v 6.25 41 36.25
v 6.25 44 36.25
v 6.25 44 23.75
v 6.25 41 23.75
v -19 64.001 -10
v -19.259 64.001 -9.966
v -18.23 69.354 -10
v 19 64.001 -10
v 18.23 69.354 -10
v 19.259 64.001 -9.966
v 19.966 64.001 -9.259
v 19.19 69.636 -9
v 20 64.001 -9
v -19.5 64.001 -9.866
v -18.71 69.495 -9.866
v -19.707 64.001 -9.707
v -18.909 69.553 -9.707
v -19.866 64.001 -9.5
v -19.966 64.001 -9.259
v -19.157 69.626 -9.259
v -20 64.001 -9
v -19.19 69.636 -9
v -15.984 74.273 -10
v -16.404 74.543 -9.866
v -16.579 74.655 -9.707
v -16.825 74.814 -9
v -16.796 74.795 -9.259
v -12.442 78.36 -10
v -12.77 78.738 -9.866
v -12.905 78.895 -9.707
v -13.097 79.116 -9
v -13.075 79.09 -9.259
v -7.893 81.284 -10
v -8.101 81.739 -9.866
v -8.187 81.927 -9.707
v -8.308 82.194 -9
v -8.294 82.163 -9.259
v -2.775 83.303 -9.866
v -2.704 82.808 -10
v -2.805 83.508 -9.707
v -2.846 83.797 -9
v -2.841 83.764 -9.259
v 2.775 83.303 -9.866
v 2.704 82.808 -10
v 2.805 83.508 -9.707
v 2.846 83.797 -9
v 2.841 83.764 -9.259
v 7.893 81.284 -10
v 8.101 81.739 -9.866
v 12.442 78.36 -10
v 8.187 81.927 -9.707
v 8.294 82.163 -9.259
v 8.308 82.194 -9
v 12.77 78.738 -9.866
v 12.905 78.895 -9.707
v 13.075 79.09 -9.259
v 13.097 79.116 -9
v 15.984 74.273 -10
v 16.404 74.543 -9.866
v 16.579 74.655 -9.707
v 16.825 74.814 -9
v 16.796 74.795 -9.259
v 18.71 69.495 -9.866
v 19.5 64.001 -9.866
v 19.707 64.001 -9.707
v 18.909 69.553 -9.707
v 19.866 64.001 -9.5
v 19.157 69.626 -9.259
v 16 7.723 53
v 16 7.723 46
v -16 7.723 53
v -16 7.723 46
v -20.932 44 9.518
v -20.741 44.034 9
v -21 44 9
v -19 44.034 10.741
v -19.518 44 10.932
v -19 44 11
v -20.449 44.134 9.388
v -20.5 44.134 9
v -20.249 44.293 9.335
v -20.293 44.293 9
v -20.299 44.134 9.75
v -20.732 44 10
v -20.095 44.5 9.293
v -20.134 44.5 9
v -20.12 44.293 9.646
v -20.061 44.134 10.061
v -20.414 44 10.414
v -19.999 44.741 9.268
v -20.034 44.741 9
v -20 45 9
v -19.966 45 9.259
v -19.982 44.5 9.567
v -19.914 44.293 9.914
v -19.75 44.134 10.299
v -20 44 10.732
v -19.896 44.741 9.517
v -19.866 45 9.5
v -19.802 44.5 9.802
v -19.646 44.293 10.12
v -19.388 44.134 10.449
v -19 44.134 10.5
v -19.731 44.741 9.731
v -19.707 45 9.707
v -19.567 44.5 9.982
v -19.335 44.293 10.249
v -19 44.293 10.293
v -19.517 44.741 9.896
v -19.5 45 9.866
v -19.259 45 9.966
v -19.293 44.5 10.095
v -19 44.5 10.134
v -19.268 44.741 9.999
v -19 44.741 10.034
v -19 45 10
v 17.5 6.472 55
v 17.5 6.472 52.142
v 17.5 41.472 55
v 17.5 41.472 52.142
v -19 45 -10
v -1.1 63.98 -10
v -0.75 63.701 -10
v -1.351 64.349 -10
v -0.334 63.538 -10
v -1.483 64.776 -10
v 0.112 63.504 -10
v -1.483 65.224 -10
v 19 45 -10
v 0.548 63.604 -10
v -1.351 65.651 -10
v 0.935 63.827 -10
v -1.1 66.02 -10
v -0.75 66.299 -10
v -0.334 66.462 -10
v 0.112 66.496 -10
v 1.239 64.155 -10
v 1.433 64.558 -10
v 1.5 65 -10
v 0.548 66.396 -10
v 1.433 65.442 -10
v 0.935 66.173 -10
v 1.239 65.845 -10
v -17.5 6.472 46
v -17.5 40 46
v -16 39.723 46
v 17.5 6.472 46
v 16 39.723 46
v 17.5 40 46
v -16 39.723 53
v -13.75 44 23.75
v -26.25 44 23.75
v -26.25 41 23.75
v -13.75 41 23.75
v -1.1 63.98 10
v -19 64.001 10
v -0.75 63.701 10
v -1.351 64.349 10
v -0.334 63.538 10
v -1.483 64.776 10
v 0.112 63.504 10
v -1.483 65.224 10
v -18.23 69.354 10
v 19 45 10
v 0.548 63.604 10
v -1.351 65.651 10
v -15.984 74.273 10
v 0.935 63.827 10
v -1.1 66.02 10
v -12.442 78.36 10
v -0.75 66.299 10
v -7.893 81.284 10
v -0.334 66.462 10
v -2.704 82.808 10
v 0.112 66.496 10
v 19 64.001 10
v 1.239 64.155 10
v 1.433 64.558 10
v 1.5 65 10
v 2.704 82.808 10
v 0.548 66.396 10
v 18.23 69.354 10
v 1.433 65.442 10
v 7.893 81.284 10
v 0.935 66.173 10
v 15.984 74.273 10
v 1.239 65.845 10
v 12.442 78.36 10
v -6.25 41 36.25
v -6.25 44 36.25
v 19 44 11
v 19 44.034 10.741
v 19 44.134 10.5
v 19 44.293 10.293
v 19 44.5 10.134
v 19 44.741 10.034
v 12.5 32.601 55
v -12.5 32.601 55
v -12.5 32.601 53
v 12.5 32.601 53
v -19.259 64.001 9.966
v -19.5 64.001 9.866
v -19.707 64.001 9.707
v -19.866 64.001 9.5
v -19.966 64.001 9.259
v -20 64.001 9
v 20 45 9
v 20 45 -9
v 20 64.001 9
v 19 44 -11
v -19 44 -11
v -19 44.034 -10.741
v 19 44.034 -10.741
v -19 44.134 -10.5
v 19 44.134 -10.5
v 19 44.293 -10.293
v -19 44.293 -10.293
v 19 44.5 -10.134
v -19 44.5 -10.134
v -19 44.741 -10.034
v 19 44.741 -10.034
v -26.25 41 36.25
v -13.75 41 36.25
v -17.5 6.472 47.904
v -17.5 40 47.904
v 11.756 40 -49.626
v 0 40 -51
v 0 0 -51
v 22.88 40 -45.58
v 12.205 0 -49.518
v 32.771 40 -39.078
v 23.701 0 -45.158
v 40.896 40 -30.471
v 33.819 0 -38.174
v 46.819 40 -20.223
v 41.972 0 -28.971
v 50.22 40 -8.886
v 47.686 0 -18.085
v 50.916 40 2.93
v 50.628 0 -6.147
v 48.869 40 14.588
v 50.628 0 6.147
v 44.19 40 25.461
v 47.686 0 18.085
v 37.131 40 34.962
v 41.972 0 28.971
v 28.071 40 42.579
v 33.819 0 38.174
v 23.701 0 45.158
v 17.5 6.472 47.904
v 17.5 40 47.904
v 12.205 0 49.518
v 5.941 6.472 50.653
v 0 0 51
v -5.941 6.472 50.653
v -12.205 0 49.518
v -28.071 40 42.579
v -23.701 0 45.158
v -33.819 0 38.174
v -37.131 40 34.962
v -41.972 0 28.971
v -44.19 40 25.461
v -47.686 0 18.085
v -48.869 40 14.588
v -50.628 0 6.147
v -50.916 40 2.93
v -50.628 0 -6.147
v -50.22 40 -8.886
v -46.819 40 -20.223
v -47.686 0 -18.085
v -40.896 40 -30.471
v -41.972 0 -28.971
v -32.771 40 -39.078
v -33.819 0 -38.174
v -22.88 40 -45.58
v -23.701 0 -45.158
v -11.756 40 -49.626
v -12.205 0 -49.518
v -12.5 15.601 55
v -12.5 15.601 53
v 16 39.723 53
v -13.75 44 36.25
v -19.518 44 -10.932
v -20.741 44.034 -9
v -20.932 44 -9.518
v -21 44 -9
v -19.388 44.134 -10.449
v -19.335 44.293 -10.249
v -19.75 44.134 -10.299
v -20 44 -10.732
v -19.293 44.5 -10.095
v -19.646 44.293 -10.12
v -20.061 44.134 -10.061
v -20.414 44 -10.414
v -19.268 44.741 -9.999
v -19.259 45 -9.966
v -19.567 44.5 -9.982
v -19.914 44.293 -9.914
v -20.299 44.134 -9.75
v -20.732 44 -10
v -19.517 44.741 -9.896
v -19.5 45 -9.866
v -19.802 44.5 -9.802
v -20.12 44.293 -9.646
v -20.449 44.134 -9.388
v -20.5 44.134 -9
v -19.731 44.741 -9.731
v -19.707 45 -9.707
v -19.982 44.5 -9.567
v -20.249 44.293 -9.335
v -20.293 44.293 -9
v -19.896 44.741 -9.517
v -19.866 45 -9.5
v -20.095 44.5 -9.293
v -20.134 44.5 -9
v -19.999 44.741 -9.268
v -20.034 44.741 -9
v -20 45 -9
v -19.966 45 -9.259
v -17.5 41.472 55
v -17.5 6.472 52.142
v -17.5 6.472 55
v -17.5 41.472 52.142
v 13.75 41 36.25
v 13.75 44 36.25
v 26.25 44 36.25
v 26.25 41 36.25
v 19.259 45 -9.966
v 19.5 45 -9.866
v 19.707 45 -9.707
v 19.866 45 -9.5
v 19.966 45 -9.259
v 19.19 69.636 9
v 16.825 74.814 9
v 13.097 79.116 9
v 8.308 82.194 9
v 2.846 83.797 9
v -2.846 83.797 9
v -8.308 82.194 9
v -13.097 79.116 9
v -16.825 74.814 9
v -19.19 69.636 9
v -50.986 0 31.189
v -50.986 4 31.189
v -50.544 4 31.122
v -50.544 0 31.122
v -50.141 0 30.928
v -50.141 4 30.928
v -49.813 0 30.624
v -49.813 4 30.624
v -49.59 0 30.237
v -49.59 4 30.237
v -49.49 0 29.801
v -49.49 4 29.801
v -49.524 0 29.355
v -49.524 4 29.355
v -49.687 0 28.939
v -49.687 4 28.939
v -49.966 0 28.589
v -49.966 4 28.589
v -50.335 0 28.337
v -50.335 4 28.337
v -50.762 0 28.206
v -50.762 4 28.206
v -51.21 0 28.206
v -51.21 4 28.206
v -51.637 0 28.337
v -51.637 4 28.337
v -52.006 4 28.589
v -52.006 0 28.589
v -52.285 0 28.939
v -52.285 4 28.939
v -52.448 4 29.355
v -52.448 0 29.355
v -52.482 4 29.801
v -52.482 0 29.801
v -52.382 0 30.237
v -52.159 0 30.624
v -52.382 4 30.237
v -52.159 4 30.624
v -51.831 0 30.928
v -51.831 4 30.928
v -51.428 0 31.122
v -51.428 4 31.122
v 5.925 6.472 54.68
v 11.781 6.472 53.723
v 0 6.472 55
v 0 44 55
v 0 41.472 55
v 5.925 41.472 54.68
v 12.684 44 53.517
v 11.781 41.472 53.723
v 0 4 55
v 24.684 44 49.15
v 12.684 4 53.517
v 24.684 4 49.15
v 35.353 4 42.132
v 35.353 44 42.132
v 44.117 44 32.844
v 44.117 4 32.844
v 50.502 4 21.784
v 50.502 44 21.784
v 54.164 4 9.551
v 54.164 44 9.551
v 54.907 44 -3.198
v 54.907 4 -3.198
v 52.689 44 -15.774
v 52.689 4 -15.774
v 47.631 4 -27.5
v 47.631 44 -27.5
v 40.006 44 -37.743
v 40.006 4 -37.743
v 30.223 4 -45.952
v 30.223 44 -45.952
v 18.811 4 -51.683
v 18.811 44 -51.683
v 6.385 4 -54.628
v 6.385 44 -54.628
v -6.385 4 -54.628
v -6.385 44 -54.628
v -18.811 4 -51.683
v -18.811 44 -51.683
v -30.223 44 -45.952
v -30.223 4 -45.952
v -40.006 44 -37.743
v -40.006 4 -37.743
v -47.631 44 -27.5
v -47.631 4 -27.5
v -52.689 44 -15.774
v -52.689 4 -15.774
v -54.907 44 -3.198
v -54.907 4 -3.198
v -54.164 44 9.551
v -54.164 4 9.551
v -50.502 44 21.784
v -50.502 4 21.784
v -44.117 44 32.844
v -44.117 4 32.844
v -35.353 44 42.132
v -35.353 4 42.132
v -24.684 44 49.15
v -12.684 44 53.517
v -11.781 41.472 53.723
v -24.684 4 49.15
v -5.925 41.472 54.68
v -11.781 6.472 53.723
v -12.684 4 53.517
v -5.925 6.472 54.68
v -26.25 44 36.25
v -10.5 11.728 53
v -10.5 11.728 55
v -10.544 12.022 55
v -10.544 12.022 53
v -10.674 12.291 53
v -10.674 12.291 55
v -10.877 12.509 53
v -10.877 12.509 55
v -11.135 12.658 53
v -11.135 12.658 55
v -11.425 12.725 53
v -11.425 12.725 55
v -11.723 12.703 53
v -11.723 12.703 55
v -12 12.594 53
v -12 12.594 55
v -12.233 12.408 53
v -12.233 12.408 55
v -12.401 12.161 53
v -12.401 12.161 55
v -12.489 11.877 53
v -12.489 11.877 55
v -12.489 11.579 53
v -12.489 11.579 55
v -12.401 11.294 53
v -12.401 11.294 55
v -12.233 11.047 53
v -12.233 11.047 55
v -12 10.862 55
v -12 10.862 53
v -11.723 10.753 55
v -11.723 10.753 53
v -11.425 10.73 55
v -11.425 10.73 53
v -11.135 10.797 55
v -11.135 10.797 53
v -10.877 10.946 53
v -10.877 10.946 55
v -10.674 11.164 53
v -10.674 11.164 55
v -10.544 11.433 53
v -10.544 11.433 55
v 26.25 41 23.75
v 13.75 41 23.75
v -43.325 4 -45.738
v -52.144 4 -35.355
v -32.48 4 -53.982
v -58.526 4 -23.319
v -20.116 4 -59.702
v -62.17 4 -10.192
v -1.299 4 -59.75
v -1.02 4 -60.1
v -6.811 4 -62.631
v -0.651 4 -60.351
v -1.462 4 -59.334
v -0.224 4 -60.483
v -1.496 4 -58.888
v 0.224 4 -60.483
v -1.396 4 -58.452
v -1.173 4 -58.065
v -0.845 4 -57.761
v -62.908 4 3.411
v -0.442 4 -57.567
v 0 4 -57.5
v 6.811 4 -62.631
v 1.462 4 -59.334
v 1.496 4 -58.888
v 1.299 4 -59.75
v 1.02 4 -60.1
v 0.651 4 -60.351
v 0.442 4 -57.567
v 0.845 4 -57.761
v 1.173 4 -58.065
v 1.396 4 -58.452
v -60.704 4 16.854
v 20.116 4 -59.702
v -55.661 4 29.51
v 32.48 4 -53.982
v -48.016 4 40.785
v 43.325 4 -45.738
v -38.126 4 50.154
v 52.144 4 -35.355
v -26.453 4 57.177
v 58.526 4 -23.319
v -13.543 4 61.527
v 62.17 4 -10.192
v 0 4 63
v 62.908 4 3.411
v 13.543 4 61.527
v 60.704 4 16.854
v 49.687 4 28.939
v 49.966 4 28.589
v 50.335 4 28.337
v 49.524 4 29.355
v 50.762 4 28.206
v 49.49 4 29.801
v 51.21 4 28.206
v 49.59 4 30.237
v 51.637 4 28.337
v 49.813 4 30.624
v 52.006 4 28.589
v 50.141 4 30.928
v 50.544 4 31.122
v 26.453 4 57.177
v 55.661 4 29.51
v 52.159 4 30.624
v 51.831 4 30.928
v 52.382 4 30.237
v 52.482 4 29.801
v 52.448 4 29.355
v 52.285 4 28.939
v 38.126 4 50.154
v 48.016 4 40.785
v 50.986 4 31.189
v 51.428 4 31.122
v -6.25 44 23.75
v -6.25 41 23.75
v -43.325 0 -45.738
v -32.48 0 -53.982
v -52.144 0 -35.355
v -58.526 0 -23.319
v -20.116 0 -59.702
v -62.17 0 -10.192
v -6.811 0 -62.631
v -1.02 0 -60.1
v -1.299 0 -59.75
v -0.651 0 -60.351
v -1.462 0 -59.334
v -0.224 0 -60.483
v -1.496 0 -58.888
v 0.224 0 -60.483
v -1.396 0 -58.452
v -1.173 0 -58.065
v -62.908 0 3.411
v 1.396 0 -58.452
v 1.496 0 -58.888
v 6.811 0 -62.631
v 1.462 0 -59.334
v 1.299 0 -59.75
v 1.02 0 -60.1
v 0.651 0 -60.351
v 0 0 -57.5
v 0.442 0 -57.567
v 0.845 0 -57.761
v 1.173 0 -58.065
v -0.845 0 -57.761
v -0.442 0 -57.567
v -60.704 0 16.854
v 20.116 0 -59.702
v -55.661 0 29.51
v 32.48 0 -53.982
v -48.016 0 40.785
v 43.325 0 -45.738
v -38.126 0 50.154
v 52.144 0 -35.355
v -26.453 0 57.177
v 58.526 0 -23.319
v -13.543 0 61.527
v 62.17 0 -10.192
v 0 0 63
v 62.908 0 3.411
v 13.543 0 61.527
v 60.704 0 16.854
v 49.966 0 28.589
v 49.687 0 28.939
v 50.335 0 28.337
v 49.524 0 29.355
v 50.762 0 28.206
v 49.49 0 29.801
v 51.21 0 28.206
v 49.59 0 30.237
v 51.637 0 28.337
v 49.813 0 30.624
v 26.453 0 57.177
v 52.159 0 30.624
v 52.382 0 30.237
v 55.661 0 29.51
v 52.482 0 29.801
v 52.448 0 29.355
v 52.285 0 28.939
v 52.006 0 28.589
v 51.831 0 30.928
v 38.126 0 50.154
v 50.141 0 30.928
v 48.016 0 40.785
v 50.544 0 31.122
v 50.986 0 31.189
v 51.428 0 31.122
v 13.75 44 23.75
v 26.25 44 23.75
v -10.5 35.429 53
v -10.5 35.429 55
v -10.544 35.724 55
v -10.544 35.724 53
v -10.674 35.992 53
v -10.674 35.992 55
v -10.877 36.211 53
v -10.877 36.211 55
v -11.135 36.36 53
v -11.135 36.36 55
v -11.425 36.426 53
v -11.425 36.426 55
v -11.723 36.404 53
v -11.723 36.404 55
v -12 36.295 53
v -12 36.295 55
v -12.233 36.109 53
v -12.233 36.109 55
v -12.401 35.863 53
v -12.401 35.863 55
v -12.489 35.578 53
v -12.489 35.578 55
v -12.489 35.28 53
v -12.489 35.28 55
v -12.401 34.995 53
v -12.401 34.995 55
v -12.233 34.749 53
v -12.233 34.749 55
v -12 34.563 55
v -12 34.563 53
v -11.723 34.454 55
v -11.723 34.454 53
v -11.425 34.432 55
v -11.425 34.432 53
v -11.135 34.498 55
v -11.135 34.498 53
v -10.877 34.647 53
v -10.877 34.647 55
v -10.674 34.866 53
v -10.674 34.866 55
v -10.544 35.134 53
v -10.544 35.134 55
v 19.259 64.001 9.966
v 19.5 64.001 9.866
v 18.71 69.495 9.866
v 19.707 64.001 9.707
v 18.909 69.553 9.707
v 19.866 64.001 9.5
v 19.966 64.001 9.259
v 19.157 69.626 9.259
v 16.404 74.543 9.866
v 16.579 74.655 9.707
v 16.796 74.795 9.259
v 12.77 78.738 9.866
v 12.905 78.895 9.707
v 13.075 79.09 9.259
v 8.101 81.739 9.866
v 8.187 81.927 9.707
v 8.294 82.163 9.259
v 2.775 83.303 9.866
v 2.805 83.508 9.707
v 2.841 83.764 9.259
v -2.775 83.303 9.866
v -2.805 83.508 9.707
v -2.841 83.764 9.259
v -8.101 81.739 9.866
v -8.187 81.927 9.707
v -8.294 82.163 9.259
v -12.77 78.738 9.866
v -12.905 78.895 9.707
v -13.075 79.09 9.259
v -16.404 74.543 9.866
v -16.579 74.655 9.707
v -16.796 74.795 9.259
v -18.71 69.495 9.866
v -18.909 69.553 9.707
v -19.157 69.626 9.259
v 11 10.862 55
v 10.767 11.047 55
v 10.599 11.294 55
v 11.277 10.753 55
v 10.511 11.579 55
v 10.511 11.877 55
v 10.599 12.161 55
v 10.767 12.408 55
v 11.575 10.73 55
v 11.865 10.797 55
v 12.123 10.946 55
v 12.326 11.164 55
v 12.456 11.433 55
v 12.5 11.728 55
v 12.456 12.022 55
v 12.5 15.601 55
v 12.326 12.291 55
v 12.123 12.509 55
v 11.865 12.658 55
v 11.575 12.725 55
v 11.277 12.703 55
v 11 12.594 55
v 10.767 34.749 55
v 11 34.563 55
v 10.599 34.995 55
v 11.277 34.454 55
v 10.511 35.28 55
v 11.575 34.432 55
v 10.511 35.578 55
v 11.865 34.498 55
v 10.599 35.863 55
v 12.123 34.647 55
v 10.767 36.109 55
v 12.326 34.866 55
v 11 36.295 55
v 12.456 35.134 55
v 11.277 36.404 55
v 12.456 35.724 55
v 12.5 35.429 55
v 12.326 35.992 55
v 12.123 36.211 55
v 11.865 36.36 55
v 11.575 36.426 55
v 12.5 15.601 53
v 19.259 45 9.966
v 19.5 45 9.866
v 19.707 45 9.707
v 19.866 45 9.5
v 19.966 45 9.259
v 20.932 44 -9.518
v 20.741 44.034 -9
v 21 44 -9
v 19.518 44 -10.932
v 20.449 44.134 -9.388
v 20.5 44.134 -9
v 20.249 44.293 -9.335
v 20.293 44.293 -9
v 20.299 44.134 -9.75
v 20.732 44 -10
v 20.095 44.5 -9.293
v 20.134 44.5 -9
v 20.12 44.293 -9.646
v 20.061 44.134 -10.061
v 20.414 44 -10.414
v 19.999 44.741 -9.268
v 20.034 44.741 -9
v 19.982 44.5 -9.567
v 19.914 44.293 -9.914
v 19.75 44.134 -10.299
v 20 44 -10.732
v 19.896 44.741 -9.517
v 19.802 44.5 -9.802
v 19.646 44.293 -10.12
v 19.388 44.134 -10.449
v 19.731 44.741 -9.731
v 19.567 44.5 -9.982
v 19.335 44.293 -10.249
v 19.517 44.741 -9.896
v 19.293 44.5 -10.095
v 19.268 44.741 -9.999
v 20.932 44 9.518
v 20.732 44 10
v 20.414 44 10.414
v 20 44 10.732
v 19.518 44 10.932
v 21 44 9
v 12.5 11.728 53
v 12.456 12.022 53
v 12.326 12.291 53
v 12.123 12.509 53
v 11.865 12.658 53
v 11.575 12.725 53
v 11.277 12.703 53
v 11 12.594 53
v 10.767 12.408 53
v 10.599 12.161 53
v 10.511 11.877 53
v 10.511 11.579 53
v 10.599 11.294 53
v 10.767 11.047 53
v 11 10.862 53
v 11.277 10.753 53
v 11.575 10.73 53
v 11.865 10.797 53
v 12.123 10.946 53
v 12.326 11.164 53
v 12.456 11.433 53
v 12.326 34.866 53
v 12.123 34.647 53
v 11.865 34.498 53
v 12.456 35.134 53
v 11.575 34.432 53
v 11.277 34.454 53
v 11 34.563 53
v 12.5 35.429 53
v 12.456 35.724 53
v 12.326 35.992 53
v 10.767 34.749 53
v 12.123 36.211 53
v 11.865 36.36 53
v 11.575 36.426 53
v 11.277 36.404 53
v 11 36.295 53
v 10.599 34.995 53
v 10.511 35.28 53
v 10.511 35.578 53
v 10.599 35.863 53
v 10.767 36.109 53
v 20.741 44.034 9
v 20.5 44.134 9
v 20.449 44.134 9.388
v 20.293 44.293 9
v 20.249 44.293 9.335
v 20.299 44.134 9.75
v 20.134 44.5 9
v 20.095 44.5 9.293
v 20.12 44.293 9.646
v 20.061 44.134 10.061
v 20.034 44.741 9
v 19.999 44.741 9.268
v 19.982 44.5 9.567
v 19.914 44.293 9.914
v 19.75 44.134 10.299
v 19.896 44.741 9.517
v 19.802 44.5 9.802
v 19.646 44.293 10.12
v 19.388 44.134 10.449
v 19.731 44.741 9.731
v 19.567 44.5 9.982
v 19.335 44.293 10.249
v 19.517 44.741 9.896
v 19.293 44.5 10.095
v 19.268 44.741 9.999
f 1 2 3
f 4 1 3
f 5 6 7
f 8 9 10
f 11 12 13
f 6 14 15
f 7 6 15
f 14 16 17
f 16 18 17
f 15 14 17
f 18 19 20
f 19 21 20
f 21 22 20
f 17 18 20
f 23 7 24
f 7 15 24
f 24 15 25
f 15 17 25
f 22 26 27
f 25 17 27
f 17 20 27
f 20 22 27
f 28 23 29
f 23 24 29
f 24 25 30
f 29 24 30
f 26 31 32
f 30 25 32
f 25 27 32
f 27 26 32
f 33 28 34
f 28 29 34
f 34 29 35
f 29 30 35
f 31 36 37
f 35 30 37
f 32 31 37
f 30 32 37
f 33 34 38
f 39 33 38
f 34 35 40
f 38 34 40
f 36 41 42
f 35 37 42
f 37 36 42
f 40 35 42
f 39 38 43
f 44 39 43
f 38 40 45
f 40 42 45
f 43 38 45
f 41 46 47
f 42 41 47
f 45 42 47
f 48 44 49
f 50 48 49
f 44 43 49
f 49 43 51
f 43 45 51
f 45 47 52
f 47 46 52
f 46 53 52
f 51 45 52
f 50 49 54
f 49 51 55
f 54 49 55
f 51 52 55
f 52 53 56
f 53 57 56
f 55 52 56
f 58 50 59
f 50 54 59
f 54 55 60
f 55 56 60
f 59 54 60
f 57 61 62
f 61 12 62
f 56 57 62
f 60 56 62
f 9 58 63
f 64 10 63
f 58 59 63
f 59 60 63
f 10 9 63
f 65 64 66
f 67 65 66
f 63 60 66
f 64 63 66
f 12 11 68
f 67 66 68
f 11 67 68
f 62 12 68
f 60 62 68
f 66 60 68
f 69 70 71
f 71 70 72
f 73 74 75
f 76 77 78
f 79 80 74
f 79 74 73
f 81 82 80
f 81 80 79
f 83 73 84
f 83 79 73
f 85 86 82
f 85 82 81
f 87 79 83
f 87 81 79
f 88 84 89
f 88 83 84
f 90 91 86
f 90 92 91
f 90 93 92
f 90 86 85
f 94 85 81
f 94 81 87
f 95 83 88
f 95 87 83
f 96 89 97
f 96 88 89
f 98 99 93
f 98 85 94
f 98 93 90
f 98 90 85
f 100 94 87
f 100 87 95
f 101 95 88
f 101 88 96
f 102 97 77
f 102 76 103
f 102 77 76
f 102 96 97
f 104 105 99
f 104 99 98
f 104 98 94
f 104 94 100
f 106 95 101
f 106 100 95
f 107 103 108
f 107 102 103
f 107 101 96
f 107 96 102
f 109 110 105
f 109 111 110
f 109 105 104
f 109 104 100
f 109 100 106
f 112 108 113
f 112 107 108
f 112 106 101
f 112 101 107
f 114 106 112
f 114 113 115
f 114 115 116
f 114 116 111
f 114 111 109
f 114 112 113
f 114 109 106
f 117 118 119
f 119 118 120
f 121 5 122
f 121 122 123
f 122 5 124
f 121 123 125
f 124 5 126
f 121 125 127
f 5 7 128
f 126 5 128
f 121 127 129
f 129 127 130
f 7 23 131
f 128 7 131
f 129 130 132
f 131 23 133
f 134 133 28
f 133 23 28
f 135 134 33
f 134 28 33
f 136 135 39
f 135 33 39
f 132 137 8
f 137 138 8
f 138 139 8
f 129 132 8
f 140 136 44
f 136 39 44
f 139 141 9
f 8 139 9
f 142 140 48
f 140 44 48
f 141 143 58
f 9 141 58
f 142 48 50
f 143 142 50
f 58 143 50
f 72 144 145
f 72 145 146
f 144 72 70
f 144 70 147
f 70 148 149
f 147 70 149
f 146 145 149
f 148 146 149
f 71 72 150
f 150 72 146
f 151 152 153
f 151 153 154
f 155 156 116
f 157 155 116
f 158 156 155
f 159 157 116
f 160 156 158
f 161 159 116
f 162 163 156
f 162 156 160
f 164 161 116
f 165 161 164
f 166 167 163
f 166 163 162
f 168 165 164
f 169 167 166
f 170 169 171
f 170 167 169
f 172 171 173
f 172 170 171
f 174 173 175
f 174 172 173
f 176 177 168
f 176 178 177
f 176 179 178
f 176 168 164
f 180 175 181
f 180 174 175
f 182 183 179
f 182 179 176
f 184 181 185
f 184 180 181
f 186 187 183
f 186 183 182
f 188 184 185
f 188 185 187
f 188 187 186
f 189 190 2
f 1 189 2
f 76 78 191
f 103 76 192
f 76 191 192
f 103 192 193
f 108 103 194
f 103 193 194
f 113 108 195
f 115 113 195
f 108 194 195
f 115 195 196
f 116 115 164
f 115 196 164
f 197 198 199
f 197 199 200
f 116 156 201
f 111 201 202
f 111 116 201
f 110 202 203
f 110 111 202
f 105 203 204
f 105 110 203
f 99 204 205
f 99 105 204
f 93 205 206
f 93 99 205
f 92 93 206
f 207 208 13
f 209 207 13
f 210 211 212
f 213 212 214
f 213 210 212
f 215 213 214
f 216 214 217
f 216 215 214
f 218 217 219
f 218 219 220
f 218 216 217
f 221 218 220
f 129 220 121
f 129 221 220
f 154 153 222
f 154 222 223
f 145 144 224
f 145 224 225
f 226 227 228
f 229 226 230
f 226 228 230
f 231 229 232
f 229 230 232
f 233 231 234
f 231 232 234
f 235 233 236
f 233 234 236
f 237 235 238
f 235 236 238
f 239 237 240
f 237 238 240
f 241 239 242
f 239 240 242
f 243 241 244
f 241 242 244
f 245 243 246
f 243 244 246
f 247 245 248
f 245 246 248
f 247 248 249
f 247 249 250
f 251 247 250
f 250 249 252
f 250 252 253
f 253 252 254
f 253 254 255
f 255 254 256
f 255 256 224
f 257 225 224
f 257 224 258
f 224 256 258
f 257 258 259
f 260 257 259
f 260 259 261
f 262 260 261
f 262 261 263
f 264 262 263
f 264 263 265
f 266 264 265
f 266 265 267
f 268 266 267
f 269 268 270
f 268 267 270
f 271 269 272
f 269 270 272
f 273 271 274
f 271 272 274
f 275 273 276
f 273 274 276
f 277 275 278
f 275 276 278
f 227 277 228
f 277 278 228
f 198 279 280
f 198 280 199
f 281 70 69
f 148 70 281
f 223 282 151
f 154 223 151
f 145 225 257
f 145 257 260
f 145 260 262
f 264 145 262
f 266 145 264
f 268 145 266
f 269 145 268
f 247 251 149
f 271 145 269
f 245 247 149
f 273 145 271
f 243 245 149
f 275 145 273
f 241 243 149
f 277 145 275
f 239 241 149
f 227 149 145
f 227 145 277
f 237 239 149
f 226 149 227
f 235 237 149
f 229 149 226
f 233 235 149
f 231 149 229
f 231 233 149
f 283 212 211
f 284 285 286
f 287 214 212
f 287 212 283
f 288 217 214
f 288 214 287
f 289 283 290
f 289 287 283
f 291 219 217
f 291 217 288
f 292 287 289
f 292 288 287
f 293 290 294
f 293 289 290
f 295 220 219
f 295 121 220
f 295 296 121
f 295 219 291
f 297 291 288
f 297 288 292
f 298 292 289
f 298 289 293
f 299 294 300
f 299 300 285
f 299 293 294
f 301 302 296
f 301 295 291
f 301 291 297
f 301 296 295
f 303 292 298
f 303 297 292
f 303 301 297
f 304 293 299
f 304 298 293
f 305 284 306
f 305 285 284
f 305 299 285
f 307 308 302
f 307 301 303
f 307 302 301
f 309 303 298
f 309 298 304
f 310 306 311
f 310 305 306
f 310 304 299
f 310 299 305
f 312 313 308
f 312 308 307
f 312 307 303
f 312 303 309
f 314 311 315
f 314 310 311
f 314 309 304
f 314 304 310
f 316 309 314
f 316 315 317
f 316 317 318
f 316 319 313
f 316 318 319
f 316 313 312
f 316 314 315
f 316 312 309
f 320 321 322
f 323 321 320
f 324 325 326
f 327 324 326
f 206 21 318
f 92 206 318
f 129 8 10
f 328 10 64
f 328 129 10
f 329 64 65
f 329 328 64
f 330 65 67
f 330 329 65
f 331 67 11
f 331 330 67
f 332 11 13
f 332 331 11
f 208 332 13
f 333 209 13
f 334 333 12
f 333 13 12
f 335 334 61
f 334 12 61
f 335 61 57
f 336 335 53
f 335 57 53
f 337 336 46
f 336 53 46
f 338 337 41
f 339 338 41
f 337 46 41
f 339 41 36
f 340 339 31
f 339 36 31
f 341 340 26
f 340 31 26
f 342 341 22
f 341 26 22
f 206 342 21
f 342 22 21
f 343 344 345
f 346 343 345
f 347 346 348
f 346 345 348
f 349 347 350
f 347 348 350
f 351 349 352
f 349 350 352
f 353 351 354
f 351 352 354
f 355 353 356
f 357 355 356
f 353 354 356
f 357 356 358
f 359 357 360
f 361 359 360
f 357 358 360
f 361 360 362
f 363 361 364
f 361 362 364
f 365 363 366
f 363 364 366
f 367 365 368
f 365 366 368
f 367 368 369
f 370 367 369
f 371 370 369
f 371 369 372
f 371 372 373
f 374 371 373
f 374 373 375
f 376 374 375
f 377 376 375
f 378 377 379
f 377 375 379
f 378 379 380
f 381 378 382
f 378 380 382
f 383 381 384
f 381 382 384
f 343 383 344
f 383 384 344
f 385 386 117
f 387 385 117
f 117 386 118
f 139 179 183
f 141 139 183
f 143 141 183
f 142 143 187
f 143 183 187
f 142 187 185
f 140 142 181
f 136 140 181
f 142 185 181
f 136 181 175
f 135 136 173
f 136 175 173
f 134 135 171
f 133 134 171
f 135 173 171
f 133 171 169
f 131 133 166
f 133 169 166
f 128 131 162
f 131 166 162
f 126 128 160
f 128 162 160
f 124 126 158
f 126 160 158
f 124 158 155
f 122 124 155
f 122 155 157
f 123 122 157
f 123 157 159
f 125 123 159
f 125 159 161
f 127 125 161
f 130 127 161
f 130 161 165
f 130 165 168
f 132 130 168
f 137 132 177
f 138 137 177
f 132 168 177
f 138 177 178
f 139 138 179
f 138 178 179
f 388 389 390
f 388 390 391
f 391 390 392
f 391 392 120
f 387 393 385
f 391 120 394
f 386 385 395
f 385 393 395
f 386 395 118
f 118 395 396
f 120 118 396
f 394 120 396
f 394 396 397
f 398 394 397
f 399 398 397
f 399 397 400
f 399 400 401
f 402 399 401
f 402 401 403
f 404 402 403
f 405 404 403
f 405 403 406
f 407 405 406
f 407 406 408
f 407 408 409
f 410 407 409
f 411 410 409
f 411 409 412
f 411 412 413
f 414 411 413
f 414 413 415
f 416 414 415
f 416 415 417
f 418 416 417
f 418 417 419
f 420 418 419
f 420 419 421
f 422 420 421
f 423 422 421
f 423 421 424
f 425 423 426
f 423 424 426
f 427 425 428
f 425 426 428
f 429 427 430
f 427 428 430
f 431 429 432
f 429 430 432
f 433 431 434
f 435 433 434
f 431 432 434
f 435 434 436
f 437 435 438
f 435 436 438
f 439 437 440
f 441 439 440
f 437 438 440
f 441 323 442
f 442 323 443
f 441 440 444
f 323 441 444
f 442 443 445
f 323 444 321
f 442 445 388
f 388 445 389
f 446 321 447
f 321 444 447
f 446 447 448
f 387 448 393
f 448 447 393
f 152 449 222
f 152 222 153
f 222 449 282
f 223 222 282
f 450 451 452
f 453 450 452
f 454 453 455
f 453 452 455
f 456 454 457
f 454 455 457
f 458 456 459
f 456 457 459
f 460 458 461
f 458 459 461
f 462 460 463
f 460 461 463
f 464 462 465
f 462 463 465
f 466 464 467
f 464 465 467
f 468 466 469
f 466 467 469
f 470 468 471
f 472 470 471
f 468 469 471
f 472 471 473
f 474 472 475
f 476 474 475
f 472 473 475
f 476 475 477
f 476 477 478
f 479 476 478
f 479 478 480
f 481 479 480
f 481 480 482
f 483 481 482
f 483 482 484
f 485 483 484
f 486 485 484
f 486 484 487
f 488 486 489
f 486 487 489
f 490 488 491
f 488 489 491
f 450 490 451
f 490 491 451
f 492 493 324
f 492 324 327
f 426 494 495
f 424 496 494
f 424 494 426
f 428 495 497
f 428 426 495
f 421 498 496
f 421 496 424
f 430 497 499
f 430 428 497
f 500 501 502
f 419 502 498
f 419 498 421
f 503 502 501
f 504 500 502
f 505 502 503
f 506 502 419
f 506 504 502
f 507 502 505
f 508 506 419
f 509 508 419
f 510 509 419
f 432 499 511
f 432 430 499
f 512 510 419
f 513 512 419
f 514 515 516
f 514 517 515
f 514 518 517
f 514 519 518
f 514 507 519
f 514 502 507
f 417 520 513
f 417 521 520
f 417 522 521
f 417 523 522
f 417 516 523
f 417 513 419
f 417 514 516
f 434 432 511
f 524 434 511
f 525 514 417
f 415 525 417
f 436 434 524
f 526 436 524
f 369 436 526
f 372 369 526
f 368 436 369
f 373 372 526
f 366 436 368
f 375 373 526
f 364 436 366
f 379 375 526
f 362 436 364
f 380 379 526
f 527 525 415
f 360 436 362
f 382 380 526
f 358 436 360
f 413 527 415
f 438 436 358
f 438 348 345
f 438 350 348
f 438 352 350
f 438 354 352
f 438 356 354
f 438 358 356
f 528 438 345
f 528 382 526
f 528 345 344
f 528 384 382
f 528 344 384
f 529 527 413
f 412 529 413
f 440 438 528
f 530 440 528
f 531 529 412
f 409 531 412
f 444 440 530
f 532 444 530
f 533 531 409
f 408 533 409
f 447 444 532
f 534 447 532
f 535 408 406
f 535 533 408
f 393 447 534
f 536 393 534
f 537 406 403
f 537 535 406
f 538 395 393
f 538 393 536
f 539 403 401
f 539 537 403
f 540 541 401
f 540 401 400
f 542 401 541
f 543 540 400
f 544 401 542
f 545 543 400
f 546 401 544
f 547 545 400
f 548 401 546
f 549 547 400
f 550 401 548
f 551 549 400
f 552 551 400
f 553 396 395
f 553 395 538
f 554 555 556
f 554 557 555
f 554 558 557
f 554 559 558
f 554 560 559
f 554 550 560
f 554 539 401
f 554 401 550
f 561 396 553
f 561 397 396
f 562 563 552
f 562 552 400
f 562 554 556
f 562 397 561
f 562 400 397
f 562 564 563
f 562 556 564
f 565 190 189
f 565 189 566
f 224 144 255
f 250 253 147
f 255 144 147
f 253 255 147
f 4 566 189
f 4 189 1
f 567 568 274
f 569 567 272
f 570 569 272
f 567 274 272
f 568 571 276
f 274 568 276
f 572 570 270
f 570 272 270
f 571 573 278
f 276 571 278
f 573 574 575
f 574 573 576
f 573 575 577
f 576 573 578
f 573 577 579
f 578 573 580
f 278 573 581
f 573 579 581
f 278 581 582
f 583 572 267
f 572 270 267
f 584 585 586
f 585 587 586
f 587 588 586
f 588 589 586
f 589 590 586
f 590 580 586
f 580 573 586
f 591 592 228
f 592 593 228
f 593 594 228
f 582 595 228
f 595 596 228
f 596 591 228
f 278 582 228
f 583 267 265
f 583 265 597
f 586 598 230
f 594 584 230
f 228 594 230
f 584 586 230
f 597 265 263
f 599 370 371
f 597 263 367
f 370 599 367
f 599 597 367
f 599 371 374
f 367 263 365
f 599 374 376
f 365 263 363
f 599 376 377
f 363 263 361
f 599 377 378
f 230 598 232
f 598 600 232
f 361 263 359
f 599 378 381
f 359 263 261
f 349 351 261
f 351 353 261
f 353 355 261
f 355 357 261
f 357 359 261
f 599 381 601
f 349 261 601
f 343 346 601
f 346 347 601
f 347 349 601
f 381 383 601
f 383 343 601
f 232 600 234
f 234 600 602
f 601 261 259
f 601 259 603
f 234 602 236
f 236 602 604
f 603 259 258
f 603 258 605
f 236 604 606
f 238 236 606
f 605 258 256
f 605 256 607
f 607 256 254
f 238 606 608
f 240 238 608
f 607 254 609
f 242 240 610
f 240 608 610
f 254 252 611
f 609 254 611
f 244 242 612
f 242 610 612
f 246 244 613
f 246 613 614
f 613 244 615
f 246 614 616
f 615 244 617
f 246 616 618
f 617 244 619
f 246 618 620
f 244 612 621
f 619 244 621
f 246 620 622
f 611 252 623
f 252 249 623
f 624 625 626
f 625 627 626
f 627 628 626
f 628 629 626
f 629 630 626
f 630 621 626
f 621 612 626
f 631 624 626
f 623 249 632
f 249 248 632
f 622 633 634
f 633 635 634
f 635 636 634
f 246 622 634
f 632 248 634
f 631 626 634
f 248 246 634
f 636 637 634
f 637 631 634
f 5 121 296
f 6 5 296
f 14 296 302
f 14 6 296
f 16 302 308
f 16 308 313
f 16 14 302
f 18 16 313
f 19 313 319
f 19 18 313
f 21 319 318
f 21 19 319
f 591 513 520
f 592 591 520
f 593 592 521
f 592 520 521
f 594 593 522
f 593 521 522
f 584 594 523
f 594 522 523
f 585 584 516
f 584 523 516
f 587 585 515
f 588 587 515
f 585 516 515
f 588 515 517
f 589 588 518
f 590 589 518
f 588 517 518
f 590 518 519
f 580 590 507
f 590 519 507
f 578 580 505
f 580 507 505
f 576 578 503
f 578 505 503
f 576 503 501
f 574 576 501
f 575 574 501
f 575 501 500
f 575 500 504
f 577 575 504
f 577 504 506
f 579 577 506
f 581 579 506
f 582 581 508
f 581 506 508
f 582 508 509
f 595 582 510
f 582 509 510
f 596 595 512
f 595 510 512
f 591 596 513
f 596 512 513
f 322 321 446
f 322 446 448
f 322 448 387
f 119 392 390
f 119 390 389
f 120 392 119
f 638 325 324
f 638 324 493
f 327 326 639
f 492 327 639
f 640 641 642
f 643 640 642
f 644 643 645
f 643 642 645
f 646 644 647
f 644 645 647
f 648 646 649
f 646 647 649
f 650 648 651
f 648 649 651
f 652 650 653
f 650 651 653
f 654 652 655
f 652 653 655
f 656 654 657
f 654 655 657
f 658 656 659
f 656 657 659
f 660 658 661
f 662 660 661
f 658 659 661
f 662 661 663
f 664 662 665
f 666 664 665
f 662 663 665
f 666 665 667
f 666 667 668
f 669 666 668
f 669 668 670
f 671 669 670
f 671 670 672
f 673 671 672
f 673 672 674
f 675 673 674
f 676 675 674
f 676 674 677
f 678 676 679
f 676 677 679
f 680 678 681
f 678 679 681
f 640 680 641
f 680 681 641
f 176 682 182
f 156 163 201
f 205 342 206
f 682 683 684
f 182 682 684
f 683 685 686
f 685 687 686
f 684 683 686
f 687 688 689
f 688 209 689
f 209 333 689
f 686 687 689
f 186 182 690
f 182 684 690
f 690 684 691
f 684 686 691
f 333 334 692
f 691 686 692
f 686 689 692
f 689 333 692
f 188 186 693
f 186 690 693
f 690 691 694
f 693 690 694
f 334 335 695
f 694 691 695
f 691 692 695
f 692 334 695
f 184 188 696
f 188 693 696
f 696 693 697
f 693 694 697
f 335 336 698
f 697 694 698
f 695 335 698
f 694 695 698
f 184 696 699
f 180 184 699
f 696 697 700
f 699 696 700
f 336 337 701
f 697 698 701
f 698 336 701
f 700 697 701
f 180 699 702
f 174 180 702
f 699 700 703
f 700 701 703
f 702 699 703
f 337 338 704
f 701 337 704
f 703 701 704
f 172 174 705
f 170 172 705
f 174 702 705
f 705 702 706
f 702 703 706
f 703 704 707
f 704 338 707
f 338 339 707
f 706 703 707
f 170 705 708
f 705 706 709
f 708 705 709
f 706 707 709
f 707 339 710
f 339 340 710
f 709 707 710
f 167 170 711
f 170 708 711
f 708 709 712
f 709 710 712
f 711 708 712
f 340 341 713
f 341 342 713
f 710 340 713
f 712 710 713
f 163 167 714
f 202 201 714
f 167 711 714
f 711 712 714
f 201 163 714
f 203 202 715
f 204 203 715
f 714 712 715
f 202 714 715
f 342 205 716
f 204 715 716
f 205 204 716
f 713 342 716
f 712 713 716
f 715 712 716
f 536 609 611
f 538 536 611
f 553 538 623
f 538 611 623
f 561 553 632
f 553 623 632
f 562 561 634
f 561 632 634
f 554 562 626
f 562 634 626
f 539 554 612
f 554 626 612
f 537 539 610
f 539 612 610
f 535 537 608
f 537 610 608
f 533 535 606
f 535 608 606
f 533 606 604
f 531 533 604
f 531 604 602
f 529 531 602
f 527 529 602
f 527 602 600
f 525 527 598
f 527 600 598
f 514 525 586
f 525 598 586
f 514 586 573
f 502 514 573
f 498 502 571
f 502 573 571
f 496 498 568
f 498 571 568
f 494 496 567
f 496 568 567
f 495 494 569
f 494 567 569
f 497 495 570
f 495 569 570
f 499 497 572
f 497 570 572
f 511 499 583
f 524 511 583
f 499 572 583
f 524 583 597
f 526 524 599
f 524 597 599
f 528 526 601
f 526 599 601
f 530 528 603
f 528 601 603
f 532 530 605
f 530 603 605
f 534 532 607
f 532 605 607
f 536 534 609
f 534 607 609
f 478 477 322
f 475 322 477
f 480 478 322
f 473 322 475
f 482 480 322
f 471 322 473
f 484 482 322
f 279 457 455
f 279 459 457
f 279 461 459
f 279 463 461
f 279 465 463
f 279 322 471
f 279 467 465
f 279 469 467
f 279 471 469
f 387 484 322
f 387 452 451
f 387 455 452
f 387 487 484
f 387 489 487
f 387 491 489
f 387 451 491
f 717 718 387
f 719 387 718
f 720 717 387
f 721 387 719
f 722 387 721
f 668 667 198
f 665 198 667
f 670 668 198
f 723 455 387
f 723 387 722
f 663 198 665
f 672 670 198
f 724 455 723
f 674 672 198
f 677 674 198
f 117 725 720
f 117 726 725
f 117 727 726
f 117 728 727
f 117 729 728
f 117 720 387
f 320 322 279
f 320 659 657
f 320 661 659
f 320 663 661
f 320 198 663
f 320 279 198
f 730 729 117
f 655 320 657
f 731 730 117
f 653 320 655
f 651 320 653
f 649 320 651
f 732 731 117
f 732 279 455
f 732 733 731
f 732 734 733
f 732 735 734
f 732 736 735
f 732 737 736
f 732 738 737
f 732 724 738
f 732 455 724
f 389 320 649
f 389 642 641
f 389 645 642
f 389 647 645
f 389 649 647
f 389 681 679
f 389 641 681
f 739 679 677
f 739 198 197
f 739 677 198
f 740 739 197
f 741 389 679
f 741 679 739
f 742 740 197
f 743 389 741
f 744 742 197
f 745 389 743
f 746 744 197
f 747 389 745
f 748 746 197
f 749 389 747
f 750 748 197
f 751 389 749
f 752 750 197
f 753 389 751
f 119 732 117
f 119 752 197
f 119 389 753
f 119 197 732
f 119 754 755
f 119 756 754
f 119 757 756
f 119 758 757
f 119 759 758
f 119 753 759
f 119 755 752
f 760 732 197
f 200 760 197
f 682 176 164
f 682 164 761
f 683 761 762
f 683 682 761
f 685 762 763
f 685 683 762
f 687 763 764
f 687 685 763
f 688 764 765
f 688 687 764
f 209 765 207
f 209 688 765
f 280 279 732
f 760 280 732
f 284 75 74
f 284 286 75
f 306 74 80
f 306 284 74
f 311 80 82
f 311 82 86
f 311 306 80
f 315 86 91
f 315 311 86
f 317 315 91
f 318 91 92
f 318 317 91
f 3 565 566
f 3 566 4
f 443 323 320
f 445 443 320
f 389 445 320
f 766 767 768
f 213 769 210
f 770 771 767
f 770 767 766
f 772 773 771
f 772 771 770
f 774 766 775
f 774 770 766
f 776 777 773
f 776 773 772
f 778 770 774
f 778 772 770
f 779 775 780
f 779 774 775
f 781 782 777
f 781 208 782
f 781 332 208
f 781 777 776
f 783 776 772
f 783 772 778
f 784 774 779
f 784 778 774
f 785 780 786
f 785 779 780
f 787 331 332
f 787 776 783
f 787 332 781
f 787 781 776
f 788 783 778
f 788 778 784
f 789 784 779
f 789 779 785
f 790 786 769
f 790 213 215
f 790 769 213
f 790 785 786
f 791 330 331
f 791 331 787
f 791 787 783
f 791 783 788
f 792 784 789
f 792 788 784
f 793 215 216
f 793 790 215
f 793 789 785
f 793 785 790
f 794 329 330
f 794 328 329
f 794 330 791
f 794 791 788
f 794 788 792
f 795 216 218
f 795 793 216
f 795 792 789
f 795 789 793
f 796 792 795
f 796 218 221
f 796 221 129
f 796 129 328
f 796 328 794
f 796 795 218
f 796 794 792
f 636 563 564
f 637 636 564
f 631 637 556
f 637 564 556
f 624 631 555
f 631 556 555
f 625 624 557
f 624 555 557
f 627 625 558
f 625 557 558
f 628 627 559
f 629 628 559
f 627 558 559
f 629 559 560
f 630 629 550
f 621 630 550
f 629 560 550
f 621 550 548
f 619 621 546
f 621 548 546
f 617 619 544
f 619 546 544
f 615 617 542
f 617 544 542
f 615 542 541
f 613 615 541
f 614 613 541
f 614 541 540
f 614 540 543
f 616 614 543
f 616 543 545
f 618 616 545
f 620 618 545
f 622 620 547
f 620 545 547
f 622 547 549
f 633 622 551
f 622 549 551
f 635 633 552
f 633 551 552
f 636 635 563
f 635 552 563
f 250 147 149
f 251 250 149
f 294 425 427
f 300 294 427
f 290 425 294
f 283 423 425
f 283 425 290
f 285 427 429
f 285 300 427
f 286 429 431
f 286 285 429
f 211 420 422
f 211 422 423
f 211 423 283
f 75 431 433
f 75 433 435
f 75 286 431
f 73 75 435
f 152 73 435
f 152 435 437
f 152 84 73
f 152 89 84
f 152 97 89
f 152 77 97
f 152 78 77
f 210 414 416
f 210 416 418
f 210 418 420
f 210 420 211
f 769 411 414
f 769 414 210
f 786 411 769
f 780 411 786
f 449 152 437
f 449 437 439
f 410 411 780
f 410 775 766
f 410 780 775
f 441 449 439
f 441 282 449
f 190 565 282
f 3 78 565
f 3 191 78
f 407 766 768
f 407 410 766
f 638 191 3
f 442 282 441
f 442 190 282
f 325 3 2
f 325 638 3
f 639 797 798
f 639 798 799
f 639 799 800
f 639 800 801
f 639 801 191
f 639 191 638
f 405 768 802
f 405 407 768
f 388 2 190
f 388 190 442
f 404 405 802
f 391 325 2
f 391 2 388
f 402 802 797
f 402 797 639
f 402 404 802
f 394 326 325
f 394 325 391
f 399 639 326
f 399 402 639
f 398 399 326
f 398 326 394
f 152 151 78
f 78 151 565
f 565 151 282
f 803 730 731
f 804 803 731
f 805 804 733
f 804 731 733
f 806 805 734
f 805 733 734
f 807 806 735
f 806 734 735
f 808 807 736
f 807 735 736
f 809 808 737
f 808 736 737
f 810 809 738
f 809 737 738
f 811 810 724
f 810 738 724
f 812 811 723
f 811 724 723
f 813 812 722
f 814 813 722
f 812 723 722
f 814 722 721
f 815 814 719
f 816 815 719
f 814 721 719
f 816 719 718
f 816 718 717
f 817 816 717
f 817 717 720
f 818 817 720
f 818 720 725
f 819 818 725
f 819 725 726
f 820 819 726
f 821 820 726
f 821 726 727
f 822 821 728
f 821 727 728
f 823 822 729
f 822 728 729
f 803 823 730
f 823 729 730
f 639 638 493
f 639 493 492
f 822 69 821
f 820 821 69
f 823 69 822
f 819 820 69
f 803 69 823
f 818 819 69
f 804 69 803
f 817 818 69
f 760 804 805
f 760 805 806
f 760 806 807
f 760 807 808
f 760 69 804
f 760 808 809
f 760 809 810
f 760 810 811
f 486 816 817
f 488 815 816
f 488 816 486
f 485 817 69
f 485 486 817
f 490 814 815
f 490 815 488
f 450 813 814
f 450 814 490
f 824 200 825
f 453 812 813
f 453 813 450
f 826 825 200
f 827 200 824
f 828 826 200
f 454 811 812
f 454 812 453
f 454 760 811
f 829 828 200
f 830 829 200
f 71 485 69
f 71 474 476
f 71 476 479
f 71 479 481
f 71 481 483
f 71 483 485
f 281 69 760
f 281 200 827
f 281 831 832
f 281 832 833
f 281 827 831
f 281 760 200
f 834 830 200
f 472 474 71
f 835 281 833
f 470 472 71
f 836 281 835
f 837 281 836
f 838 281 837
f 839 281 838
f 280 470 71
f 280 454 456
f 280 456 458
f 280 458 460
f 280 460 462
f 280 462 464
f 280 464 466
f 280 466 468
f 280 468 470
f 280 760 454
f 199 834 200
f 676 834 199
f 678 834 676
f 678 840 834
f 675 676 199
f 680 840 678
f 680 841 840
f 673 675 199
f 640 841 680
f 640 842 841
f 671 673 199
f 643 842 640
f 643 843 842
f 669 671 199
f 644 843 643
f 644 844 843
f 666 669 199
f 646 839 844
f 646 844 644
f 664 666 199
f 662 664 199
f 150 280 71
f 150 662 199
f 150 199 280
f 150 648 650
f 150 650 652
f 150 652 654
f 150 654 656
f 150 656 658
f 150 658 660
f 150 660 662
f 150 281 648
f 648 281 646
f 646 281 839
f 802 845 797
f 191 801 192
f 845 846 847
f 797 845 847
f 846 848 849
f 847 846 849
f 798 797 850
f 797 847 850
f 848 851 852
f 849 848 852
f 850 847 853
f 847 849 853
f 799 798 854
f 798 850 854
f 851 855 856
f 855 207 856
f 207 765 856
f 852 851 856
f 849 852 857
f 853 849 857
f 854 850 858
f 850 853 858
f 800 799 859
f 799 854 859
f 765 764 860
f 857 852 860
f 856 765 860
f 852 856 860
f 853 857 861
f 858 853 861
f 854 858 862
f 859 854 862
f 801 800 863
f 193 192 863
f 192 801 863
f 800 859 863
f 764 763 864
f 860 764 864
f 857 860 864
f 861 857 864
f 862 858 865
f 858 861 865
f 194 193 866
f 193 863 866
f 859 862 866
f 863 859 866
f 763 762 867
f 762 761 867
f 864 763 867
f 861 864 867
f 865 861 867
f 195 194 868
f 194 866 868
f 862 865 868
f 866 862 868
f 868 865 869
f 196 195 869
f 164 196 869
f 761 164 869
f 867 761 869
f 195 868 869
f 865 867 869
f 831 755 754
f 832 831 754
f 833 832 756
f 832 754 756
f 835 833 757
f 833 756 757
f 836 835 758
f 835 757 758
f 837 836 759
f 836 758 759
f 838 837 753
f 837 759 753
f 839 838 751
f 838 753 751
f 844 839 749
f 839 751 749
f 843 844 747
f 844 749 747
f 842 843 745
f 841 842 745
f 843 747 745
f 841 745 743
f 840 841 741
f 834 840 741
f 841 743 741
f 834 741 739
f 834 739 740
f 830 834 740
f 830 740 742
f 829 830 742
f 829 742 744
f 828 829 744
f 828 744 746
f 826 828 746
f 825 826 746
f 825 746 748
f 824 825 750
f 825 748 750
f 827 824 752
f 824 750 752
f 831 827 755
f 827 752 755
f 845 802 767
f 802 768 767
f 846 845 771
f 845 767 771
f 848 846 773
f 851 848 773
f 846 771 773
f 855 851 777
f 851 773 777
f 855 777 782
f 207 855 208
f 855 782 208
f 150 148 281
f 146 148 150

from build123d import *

# Parameters (mm, degrees)
SKETCH1_R            = 63
BOSS_EXTRUDE4_DEPTH  = 4
SKETCH2_R            = 55
BOSS_EXTRUDE5_DEPTH  = 40
SKETCH3_R            = 51
CUT_EXTRUDE1_DEPTH   = 40
SKETCH9_W            = 40
SKETCH9_H            = 20
BOSS_EXTRUDE8_DEPTH  = 0.001
BOSS_EXTRUDE9_DEPTH  = 20
SKETCH12_R           = 1.5
CUT_EXTRUDE4_DEPTH   = 20
BOSS_EXTRUDE10_START = -9
SKETCH22_W           = 35
SKETCH22_H           = 35
BOSS_EXTRUDE10_DEPTH = 9
SKETCH24_W           = 32
SKETCH24_H           = 32
CUT_EXTRUDE15_DEPTH  = 7
FILLET6_R            = 1
SKETCH25_W           = 25
SKETCH25_H           = 17
CUT_EXTRUDE16_DEPTH  = 2
SKETCH26_R           = 1
CUT_EXTRUDE18_DEPTH  = 2
SKETCH30_W           = 12.5
SKETCH30_H           = 12.5
CUT_EXTRUDE24_DEPTH  = 3
SKETCH29_R           = 1.5
CUT_EXTRUDE25_DEPTH  = 4


with BuildPart() as part:
    # Sketch1 → Boss-Extrude4 (new body)
    with BuildSketch(Plane(origin=(0, 0, 0), x_dir=(1, 0, 0), z_dir=(0, 1, 0))):
        with Locations(Location((0, 0, 0), (0, 0, 270))):
            Circle(SKETCH1_R)
    extrude(amount=BOSS_EXTRUDE4_DEPTH)

    # Sketch2 → Boss-Extrude5 (add)
    with BuildSketch(Plane(origin=(0, 4, 0), x_dir=(1, 0, 0), z_dir=(0, 1, 0))):
        with Locations(Location((0, 0, 0), (0, 0, 270))):
            Circle(SKETCH2_R)
    extrude(amount=BOSS_EXTRUDE5_DEPTH)

    # Sketch3 → Cut-Extrude1 (cut)
    with BuildSketch(Plane.XZ):
        with Locations(Location((0, 0, 0), (0, 0, 270))):
            Circle(SKETCH3_R)
    extrude(amount=-CUT_EXTRUDE1_DEPTH, mode=Mode.SUBTRACT)

    # Sketch9 → Boss-Extrude8 (add)
    with BuildSketch(Plane(origin=(0, 44, 0), x_dir=(1, 0, 0), z_dir=(0, 1, 0))):
        Rectangle(SKETCH9_W, SKETCH9_H)
    extrude(amount=BOSS_EXTRUDE8_DEPTH)

    # Sketch11 → Boss-Extrude9 (add)
    with BuildSketch(Plane(origin=(0, 0, -10), x_dir=(-1, 0, 0), z_dir=(0, 0, -1))):
        with BuildLine():
            Line((-20, 44.001), (-20, 64.001))
            ThreePointArc((-20, 64.001), (0, 84.001), (20, 64.001))
            Line((20, 64.001), (20, 44.001))
            Line((20, 44.001), (-20, 44.001))
        make_face()
    extrude(amount=-BOSS_EXTRUDE9_DEPTH)

    # Sketch12 → Cut-Extrude4 (cut)
    with BuildSketch(Plane.XY.offset(10)):
        with Locations((0, 65)):
            Circle(SKETCH12_R)
    extrude(amount=-CUT_EXTRUDE4_DEPTH, mode=Mode.SUBTRACT)

    # Sketch22 → Boss-Extrude10 (add)
    with BuildSketch(Plane.XY.offset(55).offset(BOSS_EXTRUDE10_START)):
        with Locations((0, 23.97160628)):
            Rectangle(SKETCH22_W, SKETCH22_H)
    extrude(amount=BOSS_EXTRUDE10_DEPTH)

    # Sketch24 → Cut-Extrude15 (cut)
    with BuildSketch(Plane(origin=(0, 0, 46), x_dir=(-1, 0, 0), z_dir=(0, 0, -1))):
        with Locations((0, 23.722591491)):
            Rectangle(SKETCH24_W, SKETCH24_H)
    extrude(amount=-CUT_EXTRUDE15_DEPTH, mode=Mode.SUBTRACT)

    # Fillet6
    fillet6_edges = [part.edges().sort_by_distance(p)[0] for p in [
        (-20, 44, 0),
        (-20, 54.0005, -10),
        (0, 44, 10),
        (-20, 54.0005, 10),
        (20, 44, 0),
        (20, 54.0005, 10),
        (0, 44, -10),
        (20, 54.0005, -10),
        (0, 84.001, -10),
        (0, 84.001, 10),
    ]]
    fillet(fillet6_edges, radius=FILLET6_R)

    # Sketch25 → Cut-Extrude16 (cut)
    with BuildSketch(Plane.XY.offset(55)):
        with Locations((0, 24.10057748)):
            Rectangle(SKETCH25_W, SKETCH25_H)
    extrude(amount=-CUT_EXTRUDE16_DEPTH, mode=Mode.SUBTRACT)

    # Sketch26 → Cut-Extrude18 (cut)
    with BuildSketch(Plane.XY.offset(55)):
        with Locations((-11.5, 35.429004604)):
            Circle(SKETCH26_R)
        with Locations((11.5, 35.429004604)):
            Circle(SKETCH26_R)
        with Locations((11.5, 11.727594133)):
            Circle(SKETCH26_R)
        with Locations((-11.5, 11.727594133)):
            Circle(SKETCH26_R)
    extrude(amount=-CUT_EXTRUDE18_DEPTH, mode=Mode.SUBTRACT)

    # Sketch30 → Cut-Extrude24 (cut)
    with BuildSketch(Plane(origin=(0, 44, 0), x_dir=(1, 0, 0), z_dir=(0, 1, 0))):
        with Locations((20, -30)):
            Rectangle(SKETCH30_W, SKETCH30_H)
        with Locations((0, -30)):
            Rectangle(SKETCH30_W, SKETCH30_H)
        with Locations((-20, -30)):
            Rectangle(SKETCH30_W, SKETCH30_H)
    extrude(amount=-CUT_EXTRUDE24_DEPTH, mode=Mode.SUBTRACT)

    # Sketch29 → Cut-Extrude25 (cut)
    with BuildSketch(Plane(origin=(0, 4, 0), x_dir=(1, 0, 0), z_dir=(0, 1, 0))):
        with Locations(Location((0, 59, 0), (0, 0, 270))):
            Circle(SKETCH29_R)
        with Locations(Location((-50.985971771, -29.688898305, 0), (0, 0, 270))):
            Circle(SKETCH29_R)
        with Locations(Location((50.985971771, -29.688898305, 0), (0, 0, 270))):
            Circle(SKETCH29_R)
    extrude(amount=-CUT_EXTRUDE25_DEPTH, mode=Mode.SUBTRACT)


solid = part.part
